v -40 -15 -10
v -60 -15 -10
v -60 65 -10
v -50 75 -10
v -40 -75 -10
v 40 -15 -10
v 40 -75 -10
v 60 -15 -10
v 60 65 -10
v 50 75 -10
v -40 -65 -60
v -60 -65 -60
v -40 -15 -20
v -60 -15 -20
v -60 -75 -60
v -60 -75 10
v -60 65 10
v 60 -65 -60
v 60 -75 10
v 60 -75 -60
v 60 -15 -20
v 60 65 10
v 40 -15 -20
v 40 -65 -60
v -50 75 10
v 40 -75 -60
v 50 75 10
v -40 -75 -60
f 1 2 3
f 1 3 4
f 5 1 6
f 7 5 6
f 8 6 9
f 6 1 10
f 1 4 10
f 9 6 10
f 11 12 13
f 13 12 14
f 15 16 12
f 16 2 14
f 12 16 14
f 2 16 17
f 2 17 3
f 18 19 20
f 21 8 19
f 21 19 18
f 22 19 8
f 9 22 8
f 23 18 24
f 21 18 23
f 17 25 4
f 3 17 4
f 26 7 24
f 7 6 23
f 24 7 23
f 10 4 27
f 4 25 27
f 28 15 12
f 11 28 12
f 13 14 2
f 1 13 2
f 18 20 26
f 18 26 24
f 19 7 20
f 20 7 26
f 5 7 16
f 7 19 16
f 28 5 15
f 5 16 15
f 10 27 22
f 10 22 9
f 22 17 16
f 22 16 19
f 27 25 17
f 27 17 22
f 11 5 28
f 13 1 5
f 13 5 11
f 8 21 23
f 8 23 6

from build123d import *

# Parameters (mm, degrees)
SKETCH_1_W      = 120
SKETCH_1_H      = 150
EXTRUDE_1_DEPTH = 10
CHAMFER_1_SIZE  = 10
EXTRUDE_2_DEPTH = 20


with BuildPart() as part:
    # 草图1 → 凸台-拉伸1 (new, symmetric)
    with BuildSketch(Plane.XY):
        Rectangle(SKETCH_1_W, SKETCH_1_H)
    extrude(amount=EXTRUDE_1_DEPTH, both=True)

    # 倒角1
    chamfer_1_edges = [part.edges().sort_by_distance(p)[0] for p in [
        (-60, 75, 0),
        (60, 75, 0),
    ]]
    chamfer(chamfer_1_edges, length=CHAMFER_1_SIZE)

    # 草图2 → 凸台-拉伸2 (add)
    with BuildSketch(Plane(origin=(60, 0, 0), x_dir=(0, 0, -1), z_dir=(1, 0, 0))):
        Polygon((10, -75), (60, -75), (60, -65), (20, -15), (10, -15), align=None)
    extrude_2 = extrude(amount=-EXTRUDE_2_DEPTH)

    # 镜向1: 凸台-拉伸2 across plane
    add(extrude_2.mirror(Plane(origin=(0, 0, 0), x_dir=(0, 0, 1), z_dir=(1, 0, 0))))


solid = part.part
